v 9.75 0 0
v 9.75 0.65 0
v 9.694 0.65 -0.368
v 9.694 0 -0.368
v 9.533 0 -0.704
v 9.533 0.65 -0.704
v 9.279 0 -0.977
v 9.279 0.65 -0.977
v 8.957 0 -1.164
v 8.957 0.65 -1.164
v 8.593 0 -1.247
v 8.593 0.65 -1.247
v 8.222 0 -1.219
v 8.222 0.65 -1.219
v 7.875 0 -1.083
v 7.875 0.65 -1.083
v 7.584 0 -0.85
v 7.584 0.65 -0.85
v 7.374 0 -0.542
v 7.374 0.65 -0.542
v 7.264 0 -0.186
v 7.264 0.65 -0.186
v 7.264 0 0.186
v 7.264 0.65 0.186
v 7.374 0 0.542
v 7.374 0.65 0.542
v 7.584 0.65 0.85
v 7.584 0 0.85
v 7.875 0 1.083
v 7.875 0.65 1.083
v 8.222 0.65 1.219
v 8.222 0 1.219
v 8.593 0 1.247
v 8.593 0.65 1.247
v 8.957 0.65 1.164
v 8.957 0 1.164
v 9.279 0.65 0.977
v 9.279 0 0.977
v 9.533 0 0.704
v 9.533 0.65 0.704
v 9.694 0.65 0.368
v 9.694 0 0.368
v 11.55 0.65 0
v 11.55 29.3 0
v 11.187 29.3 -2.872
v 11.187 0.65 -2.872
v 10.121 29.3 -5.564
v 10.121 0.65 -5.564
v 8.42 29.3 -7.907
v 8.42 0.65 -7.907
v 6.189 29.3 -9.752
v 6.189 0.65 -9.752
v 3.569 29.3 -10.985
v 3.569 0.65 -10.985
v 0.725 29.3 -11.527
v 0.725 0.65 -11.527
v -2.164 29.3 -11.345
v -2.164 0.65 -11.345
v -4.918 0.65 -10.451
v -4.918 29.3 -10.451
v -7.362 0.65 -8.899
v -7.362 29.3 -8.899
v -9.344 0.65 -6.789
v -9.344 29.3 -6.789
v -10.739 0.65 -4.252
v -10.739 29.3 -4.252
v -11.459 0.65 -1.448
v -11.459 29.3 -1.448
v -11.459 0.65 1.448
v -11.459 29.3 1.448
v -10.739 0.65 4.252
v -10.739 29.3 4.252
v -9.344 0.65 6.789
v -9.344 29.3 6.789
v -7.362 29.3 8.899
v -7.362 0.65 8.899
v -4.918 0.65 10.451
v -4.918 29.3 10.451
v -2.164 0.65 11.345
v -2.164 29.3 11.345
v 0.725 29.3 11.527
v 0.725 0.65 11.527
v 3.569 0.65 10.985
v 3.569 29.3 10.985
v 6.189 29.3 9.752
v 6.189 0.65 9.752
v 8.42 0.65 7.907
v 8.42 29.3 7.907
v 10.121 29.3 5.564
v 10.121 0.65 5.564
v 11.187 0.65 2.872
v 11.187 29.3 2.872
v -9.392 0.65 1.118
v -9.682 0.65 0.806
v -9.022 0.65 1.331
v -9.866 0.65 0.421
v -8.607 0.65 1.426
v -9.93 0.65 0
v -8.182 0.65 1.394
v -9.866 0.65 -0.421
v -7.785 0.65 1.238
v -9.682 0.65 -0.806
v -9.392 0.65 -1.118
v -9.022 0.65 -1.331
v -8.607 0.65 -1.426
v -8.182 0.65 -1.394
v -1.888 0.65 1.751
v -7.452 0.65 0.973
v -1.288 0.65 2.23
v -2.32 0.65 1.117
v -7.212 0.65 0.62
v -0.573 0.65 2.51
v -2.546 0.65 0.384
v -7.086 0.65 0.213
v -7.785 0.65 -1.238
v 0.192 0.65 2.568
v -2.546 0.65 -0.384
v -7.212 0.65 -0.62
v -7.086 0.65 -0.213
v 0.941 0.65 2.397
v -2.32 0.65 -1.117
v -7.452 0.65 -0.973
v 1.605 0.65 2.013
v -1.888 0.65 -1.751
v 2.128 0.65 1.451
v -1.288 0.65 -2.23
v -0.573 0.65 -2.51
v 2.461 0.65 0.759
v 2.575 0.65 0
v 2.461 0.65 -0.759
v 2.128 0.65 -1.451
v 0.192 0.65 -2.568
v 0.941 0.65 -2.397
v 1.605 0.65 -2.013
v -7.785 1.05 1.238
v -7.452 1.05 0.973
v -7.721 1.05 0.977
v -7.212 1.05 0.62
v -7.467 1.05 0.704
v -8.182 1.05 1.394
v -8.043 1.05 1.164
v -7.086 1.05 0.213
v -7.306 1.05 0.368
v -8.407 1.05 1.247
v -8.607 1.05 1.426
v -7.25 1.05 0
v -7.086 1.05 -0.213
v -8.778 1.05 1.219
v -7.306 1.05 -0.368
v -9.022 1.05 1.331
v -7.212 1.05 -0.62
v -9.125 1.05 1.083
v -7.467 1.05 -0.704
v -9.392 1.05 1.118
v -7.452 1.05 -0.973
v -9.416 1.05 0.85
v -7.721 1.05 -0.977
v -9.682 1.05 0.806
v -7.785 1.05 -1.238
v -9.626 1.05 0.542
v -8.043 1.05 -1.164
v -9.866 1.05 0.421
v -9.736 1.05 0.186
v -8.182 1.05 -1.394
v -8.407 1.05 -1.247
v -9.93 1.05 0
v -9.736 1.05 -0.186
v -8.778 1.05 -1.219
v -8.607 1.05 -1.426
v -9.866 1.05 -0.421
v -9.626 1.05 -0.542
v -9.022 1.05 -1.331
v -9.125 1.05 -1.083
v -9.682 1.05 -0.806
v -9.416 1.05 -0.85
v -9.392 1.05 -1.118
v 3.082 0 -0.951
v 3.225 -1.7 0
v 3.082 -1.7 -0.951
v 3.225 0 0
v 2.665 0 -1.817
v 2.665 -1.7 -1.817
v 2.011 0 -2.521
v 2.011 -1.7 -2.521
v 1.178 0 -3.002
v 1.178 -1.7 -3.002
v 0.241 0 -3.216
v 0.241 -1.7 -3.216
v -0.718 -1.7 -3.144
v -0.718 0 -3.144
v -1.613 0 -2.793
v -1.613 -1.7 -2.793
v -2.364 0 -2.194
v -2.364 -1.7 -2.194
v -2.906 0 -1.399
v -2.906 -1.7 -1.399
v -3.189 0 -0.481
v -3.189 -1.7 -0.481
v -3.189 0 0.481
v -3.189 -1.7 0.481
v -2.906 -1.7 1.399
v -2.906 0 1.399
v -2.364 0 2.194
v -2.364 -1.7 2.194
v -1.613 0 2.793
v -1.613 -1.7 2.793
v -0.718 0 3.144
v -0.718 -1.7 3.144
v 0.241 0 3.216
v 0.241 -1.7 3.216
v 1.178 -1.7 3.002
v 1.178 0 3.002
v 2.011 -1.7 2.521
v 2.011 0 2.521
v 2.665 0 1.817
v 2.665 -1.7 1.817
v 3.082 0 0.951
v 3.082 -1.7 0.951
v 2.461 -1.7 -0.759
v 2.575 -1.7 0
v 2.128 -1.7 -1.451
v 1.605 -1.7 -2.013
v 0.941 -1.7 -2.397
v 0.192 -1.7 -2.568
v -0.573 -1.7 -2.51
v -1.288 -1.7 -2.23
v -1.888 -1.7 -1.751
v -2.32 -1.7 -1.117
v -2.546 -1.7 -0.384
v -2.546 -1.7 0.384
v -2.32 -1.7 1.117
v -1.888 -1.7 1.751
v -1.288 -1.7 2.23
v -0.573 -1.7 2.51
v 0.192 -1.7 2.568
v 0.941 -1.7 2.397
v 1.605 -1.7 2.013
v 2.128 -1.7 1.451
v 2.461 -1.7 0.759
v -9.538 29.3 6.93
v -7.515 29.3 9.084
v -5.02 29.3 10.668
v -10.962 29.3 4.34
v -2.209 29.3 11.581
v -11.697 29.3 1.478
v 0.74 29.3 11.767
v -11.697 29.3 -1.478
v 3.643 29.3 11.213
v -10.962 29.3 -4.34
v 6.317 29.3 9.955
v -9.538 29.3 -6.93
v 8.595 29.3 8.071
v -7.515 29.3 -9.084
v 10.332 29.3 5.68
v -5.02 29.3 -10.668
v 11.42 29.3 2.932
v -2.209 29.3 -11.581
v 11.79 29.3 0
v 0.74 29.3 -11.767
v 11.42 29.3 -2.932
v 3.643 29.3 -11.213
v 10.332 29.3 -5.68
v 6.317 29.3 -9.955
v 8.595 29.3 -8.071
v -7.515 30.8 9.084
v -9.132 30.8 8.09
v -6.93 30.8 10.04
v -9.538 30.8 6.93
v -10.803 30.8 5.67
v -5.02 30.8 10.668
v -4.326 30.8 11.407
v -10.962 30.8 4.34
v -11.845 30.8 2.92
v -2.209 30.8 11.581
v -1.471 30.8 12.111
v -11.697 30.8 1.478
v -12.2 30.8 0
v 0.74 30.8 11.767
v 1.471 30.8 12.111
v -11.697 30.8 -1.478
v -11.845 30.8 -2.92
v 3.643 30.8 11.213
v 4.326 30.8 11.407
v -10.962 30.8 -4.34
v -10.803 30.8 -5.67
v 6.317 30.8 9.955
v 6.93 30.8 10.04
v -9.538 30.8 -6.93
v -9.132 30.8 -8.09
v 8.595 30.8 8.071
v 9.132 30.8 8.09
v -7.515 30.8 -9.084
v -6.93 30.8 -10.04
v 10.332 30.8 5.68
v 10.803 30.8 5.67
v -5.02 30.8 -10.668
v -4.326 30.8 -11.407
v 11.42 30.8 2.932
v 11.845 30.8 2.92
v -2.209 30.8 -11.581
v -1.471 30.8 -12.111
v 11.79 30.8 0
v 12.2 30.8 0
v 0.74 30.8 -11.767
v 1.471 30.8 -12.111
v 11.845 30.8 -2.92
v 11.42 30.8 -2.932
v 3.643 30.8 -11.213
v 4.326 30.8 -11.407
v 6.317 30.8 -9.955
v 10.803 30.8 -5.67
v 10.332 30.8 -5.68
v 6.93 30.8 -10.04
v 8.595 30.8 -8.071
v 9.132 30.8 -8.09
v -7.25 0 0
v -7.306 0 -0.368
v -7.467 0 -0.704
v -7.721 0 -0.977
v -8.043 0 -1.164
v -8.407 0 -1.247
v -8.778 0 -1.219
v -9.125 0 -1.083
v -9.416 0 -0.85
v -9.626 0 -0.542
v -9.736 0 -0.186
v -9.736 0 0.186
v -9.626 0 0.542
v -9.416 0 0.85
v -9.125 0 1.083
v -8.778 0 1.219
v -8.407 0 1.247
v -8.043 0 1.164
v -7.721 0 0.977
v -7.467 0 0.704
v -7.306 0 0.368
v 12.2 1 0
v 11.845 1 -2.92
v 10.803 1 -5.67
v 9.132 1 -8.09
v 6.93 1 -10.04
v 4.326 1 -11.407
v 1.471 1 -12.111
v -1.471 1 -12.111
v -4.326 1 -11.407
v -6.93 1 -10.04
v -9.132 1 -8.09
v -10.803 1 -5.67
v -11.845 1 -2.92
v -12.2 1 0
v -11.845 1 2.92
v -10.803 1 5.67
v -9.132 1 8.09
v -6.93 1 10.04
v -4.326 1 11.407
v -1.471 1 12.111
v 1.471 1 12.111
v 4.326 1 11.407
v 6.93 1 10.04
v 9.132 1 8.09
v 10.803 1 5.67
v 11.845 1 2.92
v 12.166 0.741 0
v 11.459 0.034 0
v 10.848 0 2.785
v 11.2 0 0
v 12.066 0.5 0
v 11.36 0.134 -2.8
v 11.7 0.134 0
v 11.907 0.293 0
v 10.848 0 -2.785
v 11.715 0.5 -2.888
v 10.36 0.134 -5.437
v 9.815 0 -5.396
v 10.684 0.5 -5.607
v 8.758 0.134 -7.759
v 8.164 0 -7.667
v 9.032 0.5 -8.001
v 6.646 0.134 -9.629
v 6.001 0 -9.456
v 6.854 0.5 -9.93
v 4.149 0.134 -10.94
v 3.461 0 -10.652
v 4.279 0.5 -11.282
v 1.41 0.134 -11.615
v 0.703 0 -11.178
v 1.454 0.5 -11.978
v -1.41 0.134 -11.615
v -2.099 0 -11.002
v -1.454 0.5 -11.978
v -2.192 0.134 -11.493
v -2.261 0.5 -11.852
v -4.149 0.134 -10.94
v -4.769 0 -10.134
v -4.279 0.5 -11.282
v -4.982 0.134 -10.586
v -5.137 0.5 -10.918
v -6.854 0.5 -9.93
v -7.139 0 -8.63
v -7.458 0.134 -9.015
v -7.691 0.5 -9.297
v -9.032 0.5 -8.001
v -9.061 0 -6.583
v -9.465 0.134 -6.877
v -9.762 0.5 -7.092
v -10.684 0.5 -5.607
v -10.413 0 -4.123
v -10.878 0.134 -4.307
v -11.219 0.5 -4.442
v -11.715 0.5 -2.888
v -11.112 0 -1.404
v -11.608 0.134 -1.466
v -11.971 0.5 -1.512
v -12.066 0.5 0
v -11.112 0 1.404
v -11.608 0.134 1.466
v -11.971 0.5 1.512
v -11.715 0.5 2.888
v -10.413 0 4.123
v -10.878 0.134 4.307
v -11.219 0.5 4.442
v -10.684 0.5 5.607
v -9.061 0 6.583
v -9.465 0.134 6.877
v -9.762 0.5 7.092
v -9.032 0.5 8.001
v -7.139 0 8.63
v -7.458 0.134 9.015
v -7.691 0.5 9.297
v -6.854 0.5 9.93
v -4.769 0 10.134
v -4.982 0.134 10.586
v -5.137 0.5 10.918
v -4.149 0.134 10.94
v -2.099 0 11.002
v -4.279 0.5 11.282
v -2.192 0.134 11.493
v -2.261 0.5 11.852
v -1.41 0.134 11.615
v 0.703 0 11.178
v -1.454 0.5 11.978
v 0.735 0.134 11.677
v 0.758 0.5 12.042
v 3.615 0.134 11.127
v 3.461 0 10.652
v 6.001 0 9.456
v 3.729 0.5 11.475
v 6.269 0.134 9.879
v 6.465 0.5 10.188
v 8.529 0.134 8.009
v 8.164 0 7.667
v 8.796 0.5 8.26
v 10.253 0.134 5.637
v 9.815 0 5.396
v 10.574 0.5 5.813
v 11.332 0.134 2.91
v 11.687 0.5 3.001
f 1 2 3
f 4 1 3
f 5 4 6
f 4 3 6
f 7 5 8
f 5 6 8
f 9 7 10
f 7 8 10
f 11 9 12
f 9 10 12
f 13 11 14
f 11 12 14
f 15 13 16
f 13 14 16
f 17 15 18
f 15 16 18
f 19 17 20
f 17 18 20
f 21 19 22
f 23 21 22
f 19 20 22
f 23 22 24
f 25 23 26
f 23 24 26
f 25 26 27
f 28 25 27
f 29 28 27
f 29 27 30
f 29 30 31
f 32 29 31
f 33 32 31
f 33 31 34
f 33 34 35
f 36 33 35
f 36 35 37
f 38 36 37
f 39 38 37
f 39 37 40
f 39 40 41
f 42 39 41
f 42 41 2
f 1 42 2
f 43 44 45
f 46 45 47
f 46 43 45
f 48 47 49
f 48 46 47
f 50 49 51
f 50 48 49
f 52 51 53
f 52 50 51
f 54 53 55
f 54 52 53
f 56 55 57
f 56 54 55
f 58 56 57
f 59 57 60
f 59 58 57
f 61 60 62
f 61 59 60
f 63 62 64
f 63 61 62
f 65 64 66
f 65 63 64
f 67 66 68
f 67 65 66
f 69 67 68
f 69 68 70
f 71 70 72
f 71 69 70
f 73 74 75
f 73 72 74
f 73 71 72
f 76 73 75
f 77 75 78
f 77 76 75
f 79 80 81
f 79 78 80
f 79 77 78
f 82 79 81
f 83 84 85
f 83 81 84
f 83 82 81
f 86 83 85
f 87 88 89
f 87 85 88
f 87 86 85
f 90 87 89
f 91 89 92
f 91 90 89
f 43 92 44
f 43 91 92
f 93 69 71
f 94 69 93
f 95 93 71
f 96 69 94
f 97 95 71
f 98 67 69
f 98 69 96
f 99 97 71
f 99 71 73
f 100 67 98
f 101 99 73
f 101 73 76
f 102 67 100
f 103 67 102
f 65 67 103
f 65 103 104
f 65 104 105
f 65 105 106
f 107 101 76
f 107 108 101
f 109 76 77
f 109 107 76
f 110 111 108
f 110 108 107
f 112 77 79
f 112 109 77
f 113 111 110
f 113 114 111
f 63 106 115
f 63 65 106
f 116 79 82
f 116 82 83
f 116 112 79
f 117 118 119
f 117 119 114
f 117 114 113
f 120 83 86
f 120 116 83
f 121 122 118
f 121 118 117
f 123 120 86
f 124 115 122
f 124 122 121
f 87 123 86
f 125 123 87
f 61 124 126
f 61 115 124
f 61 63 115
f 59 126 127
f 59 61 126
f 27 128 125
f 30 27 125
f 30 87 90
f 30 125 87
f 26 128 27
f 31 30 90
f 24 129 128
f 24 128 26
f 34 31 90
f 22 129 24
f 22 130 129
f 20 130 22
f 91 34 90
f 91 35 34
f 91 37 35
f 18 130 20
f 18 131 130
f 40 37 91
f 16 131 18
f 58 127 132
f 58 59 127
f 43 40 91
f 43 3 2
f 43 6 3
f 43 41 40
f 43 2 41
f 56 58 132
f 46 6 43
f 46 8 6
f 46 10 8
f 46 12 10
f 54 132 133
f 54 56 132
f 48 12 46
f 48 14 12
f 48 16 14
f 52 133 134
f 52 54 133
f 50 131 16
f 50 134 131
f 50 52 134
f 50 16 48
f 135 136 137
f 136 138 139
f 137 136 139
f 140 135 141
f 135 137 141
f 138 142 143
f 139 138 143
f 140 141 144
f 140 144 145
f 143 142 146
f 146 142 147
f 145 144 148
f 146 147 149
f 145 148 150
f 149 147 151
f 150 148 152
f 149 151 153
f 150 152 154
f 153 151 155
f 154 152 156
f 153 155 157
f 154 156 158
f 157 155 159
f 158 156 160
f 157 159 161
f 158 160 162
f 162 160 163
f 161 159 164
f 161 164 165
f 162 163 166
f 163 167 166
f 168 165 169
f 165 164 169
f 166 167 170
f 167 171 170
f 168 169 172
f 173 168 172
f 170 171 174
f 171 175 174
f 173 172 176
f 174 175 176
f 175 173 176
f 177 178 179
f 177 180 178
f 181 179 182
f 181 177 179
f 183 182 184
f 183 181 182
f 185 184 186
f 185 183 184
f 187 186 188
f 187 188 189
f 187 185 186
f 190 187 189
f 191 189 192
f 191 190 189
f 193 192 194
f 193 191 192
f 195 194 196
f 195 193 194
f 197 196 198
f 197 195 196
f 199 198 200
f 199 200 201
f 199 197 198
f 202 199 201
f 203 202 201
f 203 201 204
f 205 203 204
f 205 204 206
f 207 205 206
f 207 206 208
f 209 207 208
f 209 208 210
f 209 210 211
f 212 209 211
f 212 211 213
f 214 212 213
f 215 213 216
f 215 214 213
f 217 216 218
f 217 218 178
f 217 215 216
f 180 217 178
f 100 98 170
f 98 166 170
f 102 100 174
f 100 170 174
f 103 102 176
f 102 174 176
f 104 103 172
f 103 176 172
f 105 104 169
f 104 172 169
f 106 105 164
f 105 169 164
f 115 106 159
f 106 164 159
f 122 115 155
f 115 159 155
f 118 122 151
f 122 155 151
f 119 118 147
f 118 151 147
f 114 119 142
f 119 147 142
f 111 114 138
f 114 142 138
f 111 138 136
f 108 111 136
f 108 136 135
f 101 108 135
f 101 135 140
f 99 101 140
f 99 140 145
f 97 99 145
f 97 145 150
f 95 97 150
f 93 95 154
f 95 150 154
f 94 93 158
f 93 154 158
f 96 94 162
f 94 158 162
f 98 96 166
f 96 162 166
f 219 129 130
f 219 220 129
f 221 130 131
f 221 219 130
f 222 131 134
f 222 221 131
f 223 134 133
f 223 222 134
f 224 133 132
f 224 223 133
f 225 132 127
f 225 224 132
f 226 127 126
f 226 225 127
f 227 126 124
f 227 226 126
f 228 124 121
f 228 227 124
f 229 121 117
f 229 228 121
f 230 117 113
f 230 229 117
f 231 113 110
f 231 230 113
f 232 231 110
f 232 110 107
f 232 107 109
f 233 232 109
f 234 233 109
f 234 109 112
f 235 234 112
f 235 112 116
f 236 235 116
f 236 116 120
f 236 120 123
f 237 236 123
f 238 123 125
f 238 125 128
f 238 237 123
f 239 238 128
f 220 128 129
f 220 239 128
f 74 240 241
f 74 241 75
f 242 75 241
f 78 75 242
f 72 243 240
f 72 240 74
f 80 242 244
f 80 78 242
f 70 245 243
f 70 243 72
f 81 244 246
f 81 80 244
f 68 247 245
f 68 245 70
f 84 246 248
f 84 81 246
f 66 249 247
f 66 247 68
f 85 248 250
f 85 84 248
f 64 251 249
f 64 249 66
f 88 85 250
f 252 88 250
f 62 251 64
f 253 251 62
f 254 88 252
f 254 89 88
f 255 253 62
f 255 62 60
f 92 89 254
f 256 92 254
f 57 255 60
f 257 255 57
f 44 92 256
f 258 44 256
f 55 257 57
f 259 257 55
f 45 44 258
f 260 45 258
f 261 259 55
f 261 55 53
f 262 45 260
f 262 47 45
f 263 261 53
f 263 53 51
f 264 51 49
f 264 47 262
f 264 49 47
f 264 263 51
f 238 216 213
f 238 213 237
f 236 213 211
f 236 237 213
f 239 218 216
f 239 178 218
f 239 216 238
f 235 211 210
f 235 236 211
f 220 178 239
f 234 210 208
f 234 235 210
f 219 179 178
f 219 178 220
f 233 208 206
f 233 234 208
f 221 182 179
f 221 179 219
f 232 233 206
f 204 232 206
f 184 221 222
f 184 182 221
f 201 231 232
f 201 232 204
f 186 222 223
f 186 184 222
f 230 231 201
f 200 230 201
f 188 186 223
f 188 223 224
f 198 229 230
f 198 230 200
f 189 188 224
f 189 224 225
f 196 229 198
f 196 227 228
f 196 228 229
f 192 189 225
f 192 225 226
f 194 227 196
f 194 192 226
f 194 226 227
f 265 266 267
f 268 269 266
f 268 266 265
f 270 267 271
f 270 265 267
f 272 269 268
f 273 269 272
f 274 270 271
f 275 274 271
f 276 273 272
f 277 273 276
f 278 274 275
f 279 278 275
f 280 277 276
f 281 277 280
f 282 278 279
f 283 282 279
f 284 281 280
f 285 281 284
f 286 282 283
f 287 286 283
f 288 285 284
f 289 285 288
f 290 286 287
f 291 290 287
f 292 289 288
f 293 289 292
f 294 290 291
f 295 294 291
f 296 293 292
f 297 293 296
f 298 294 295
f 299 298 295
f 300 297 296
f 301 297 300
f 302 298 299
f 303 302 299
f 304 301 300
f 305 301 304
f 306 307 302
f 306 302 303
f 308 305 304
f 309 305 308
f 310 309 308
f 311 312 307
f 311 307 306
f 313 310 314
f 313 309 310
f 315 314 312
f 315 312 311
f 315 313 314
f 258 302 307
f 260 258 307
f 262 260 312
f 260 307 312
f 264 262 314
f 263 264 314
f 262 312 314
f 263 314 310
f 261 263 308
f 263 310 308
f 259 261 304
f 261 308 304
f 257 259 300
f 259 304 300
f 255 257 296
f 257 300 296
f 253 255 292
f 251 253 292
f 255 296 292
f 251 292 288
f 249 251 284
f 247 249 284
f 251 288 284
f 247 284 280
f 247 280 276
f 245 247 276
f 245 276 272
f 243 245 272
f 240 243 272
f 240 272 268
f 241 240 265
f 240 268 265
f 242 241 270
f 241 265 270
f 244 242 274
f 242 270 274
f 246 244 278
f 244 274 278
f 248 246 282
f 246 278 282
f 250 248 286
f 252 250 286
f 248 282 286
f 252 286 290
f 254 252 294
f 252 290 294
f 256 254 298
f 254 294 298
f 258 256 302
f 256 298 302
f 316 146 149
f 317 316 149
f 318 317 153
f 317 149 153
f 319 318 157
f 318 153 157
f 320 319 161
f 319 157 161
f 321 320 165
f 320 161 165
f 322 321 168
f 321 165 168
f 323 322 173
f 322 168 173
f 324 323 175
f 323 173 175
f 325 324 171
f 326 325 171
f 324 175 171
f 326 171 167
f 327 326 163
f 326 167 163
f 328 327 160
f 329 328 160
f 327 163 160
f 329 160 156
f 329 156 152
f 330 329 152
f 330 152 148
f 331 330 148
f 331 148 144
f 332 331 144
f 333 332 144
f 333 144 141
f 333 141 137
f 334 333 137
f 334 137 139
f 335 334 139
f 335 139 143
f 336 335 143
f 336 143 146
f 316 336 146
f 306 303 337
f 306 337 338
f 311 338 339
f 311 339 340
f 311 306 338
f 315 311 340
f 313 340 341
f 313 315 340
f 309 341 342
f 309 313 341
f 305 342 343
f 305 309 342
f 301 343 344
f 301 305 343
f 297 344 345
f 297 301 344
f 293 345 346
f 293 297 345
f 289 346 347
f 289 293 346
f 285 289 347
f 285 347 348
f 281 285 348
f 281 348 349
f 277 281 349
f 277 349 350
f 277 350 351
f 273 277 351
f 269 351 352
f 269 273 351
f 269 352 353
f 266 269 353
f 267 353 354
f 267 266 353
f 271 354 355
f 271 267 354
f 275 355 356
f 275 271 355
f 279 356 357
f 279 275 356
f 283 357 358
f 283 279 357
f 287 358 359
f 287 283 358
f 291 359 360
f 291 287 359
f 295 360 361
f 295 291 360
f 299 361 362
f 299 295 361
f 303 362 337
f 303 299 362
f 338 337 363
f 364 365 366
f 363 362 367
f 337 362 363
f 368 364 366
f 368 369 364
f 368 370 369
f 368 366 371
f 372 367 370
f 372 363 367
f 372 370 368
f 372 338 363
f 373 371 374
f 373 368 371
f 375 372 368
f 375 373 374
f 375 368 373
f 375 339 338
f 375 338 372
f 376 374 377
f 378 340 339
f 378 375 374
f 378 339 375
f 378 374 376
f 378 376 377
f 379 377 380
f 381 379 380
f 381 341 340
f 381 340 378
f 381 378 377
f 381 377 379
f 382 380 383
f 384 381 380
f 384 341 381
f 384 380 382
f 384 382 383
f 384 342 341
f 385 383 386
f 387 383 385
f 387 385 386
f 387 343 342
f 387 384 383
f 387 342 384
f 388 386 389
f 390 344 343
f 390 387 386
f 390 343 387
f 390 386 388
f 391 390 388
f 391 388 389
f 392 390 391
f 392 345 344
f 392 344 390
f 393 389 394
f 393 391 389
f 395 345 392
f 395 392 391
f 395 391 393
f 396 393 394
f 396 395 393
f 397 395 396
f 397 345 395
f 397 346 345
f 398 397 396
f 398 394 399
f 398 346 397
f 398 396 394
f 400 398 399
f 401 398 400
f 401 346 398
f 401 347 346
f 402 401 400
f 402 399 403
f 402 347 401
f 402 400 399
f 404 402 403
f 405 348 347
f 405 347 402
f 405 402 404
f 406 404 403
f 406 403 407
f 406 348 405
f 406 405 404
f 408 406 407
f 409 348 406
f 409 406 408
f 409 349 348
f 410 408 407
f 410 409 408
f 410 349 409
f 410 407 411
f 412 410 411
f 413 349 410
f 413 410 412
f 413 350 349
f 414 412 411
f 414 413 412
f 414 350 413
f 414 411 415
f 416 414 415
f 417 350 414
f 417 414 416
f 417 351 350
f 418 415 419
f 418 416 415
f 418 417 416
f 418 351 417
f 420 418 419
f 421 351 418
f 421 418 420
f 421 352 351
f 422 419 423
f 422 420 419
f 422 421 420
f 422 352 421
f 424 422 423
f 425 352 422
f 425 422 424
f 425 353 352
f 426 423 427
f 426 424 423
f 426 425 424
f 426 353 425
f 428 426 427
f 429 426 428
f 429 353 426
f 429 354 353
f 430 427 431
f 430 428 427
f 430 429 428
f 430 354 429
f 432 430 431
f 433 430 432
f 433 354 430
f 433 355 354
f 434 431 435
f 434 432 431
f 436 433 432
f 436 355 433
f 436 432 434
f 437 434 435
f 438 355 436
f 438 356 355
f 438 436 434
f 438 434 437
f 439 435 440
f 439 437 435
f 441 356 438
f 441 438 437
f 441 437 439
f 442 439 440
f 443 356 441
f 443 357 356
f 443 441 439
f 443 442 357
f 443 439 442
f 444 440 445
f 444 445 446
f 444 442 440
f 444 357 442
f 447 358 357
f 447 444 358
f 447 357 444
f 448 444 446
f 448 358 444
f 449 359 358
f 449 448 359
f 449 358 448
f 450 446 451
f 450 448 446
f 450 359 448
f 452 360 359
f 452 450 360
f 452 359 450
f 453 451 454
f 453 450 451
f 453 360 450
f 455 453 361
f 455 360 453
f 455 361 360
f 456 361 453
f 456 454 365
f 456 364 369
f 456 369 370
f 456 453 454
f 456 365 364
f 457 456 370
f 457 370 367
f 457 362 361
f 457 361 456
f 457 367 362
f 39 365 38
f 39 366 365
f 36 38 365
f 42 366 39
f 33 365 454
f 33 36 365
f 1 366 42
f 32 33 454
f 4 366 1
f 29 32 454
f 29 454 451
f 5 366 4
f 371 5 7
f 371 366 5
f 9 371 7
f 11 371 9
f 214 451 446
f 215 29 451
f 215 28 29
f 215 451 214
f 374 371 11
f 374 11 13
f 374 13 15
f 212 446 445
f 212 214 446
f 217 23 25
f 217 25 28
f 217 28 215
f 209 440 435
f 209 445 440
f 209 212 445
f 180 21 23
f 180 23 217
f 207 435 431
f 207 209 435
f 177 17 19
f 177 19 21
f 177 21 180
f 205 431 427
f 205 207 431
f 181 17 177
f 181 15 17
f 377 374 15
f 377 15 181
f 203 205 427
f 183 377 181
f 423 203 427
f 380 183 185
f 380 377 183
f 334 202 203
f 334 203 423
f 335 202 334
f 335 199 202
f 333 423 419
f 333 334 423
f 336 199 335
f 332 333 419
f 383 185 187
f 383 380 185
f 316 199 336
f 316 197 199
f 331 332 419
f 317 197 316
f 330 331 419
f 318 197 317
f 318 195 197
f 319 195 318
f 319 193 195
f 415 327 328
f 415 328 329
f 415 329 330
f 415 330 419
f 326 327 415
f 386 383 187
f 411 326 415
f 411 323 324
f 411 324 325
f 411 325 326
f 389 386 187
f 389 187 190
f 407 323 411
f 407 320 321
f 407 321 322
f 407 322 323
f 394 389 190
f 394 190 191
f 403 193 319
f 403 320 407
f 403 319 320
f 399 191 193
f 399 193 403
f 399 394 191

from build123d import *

# Parameters (mm, degrees)
SKETCH_8_R          = 1
CUT_EXTRUDE_1_DEPTH = 31.8
SKETCH_9_W          = 0.43
SKETCH_9_H          = 0.4
HOLE_WIZARD_M3_2_D  = 2.5
SKETCH_13_R         = 11.79
CUT_EXTRUDE_2_DEPTH = 1.5
FILLET_1_R          = 1


with BuildPart() as part:
    # 草图3 → 旋转-薄壁1 (revolve)
    with BuildSketch(Plane.XY):
        Polygon((3.225, -1.7), (3.225, 0), (12.2, 0), (12.2, 30.8), (11.55, 30.8), (11.55, 0.65), (2.575, 0.65), (2.575, -1.7), align=None)
    revolve(axis=Axis((0, -2.280125191, 0), (0, 1, 0)))

    # 草图8 → 切除-拉伸1 (cut, through all)
    with BuildSketch(Plane.XZ):
        with Locations((-8.5, 0)):
            Circle(SKETCH_8_R)
        with Locations((8.5, 0)):
            Circle(SKETCH_8_R)
    extrude(amount=-CUT_EXTRUDE_1_DEPTH, mode=Mode.SUBTRACT)

    # 草图9 → 旋转-薄壁2 (revolve)
    with BuildSketch(Plane.XY):
        with Locations((-9.715, 0.85)):
            Rectangle(SKETCH_9_W, SKETCH_9_H)
    revolve(axis=Axis((-8.5, 2.007130547, 0), (0, -1, 0)))

    # M3 螺纹孔2 (through all)
    with Locations(Plane(origin=(0, 0, 0), x_dir=(-1, 0, 0), z_dir=(0, -1, 0))):
        with Locations((8.5, 0), (-8.5, 0)):
            Hole(HOLE_WIZARD_M3_2_D / 2)

    # 草图13 → 切除-拉伸2 (cut)
    with BuildSketch(Plane(origin=(0, 30.8, 0), x_dir=(1, 0, 0), z_dir=(0, 1, 0))):
        Circle(SKETCH_13_R)
    extrude(amount=-CUT_EXTRUDE_2_DEPTH, mode=Mode.SUBTRACT)

    # 圆角1
    fillet_1_edges = [part.edges().sort_by_distance(p)[0] for p in [
        (-12.2, 0, 0),
    ]]
    fillet(fillet_1_edges, radius=FILLET_1_R)


solid = part.part
